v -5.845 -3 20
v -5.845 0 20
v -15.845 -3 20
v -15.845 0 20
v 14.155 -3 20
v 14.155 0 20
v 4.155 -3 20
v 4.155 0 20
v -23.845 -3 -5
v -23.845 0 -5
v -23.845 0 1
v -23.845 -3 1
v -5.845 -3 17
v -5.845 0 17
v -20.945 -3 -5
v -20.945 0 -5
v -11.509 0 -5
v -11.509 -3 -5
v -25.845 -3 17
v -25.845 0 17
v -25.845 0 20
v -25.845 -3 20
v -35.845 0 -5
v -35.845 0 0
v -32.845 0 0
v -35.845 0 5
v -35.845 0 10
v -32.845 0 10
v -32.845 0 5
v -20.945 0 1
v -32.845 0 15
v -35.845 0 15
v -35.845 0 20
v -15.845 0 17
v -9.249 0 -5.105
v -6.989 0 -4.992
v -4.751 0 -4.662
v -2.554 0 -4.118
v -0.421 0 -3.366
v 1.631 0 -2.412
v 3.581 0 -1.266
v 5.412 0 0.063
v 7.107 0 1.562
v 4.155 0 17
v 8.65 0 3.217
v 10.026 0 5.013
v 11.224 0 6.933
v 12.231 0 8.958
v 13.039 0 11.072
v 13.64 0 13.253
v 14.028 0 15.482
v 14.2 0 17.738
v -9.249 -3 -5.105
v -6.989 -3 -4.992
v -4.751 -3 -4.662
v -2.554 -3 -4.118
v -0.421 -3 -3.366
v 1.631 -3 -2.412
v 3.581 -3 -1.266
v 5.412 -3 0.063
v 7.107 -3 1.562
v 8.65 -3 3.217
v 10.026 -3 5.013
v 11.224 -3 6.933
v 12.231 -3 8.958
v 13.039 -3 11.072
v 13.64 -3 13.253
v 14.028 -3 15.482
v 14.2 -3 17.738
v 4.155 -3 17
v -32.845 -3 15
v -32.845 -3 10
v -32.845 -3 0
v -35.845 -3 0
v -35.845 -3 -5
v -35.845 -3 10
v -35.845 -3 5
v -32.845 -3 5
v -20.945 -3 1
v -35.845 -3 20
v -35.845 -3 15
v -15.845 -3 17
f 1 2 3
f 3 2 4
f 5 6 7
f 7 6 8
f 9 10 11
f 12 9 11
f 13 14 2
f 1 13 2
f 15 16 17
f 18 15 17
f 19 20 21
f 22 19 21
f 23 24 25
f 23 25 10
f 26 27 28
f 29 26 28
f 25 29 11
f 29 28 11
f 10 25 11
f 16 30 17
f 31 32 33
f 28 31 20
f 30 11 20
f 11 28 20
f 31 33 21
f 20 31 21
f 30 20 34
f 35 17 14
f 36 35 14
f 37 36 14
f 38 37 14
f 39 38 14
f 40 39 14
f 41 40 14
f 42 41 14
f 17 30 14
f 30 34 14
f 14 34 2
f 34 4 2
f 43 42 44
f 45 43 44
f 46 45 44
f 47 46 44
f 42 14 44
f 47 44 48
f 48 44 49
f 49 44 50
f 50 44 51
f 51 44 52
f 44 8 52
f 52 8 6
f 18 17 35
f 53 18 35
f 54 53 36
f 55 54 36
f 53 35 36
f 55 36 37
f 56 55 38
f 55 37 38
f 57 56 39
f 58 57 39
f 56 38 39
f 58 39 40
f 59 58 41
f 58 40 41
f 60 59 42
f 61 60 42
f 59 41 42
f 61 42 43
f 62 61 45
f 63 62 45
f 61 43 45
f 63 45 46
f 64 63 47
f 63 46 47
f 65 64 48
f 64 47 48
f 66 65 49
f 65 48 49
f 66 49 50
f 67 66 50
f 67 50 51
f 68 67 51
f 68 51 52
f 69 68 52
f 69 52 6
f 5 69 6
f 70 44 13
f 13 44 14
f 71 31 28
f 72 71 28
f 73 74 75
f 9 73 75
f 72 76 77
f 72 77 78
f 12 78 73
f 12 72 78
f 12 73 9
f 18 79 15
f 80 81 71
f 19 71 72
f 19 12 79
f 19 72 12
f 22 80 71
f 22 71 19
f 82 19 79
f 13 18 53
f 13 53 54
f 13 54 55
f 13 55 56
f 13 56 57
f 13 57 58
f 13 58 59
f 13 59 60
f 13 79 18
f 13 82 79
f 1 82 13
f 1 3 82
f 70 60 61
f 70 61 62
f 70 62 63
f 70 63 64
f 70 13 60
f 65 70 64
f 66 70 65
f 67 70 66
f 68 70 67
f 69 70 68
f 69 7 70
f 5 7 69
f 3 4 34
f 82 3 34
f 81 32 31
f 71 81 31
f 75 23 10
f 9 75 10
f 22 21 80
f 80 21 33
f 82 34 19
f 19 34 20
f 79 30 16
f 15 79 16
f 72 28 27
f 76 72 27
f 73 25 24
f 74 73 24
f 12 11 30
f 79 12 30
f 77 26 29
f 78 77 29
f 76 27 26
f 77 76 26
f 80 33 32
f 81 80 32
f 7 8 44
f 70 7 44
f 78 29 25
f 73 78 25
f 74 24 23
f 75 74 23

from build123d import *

# Parameters (mm, degrees)
F1_DEPTH = 3


with BuildPart() as f1:
    # F0 (on Front) → F1 (new body)
    with BuildSketch(Plane.XZ):
        with BuildLine():
            Line((-20.945015, -5), (-11.508791, -5))
            ThreePointArc((-11.508791, -5), (7.107153, 1.562372), (14.154985, 20))
            Line((14.154985, 20), (4.154985, 20))
            Line((4.154985, 20), (4.154985, 17))
            Line((4.154985, 17), (-5.845015, 17))
            Line((-5.845015, 17), (-5.845015, 20))
            Line((-5.845015, 20), (-15.845015, 20))
            Line((-15.845015, 20), (-15.845015, 17))
            Line((-15.845015, 17), (-25.845015, 17))
            Line((-25.845015, 17), (-25.845015, 20))
            Line((-25.845015, 20), (-35.845015, 20))
            Line((-35.845015, 20), (-35.845015, 15))
            Line((-35.845015, 15), (-32.845015, 15))
            Line((-32.845015, 15), (-32.845015, 10))
            Line((-32.845015, 10), (-35.845015, 10))
            Line((-35.845015, 10), (-35.845015, 5))
            Line((-35.845015, 5), (-32.845015, 5))
            Line((-32.845015, 5), (-32.845015, 0))
            Line((-32.845015, 0), (-35.845015, 0))
            Line((-35.845015, 0), (-35.845015, -5))
            Line((-35.845015, -5), (-23.845015, -5))
            Line((-23.845015, -5), (-23.845015, 1))
            Line((-23.845015, 1), (-20.945015, 1))
            Line((-20.945015, 1), (-20.945015, -5))
        make_face()
    extrude(amount=F1_DEPTH)


solid = f1.part
